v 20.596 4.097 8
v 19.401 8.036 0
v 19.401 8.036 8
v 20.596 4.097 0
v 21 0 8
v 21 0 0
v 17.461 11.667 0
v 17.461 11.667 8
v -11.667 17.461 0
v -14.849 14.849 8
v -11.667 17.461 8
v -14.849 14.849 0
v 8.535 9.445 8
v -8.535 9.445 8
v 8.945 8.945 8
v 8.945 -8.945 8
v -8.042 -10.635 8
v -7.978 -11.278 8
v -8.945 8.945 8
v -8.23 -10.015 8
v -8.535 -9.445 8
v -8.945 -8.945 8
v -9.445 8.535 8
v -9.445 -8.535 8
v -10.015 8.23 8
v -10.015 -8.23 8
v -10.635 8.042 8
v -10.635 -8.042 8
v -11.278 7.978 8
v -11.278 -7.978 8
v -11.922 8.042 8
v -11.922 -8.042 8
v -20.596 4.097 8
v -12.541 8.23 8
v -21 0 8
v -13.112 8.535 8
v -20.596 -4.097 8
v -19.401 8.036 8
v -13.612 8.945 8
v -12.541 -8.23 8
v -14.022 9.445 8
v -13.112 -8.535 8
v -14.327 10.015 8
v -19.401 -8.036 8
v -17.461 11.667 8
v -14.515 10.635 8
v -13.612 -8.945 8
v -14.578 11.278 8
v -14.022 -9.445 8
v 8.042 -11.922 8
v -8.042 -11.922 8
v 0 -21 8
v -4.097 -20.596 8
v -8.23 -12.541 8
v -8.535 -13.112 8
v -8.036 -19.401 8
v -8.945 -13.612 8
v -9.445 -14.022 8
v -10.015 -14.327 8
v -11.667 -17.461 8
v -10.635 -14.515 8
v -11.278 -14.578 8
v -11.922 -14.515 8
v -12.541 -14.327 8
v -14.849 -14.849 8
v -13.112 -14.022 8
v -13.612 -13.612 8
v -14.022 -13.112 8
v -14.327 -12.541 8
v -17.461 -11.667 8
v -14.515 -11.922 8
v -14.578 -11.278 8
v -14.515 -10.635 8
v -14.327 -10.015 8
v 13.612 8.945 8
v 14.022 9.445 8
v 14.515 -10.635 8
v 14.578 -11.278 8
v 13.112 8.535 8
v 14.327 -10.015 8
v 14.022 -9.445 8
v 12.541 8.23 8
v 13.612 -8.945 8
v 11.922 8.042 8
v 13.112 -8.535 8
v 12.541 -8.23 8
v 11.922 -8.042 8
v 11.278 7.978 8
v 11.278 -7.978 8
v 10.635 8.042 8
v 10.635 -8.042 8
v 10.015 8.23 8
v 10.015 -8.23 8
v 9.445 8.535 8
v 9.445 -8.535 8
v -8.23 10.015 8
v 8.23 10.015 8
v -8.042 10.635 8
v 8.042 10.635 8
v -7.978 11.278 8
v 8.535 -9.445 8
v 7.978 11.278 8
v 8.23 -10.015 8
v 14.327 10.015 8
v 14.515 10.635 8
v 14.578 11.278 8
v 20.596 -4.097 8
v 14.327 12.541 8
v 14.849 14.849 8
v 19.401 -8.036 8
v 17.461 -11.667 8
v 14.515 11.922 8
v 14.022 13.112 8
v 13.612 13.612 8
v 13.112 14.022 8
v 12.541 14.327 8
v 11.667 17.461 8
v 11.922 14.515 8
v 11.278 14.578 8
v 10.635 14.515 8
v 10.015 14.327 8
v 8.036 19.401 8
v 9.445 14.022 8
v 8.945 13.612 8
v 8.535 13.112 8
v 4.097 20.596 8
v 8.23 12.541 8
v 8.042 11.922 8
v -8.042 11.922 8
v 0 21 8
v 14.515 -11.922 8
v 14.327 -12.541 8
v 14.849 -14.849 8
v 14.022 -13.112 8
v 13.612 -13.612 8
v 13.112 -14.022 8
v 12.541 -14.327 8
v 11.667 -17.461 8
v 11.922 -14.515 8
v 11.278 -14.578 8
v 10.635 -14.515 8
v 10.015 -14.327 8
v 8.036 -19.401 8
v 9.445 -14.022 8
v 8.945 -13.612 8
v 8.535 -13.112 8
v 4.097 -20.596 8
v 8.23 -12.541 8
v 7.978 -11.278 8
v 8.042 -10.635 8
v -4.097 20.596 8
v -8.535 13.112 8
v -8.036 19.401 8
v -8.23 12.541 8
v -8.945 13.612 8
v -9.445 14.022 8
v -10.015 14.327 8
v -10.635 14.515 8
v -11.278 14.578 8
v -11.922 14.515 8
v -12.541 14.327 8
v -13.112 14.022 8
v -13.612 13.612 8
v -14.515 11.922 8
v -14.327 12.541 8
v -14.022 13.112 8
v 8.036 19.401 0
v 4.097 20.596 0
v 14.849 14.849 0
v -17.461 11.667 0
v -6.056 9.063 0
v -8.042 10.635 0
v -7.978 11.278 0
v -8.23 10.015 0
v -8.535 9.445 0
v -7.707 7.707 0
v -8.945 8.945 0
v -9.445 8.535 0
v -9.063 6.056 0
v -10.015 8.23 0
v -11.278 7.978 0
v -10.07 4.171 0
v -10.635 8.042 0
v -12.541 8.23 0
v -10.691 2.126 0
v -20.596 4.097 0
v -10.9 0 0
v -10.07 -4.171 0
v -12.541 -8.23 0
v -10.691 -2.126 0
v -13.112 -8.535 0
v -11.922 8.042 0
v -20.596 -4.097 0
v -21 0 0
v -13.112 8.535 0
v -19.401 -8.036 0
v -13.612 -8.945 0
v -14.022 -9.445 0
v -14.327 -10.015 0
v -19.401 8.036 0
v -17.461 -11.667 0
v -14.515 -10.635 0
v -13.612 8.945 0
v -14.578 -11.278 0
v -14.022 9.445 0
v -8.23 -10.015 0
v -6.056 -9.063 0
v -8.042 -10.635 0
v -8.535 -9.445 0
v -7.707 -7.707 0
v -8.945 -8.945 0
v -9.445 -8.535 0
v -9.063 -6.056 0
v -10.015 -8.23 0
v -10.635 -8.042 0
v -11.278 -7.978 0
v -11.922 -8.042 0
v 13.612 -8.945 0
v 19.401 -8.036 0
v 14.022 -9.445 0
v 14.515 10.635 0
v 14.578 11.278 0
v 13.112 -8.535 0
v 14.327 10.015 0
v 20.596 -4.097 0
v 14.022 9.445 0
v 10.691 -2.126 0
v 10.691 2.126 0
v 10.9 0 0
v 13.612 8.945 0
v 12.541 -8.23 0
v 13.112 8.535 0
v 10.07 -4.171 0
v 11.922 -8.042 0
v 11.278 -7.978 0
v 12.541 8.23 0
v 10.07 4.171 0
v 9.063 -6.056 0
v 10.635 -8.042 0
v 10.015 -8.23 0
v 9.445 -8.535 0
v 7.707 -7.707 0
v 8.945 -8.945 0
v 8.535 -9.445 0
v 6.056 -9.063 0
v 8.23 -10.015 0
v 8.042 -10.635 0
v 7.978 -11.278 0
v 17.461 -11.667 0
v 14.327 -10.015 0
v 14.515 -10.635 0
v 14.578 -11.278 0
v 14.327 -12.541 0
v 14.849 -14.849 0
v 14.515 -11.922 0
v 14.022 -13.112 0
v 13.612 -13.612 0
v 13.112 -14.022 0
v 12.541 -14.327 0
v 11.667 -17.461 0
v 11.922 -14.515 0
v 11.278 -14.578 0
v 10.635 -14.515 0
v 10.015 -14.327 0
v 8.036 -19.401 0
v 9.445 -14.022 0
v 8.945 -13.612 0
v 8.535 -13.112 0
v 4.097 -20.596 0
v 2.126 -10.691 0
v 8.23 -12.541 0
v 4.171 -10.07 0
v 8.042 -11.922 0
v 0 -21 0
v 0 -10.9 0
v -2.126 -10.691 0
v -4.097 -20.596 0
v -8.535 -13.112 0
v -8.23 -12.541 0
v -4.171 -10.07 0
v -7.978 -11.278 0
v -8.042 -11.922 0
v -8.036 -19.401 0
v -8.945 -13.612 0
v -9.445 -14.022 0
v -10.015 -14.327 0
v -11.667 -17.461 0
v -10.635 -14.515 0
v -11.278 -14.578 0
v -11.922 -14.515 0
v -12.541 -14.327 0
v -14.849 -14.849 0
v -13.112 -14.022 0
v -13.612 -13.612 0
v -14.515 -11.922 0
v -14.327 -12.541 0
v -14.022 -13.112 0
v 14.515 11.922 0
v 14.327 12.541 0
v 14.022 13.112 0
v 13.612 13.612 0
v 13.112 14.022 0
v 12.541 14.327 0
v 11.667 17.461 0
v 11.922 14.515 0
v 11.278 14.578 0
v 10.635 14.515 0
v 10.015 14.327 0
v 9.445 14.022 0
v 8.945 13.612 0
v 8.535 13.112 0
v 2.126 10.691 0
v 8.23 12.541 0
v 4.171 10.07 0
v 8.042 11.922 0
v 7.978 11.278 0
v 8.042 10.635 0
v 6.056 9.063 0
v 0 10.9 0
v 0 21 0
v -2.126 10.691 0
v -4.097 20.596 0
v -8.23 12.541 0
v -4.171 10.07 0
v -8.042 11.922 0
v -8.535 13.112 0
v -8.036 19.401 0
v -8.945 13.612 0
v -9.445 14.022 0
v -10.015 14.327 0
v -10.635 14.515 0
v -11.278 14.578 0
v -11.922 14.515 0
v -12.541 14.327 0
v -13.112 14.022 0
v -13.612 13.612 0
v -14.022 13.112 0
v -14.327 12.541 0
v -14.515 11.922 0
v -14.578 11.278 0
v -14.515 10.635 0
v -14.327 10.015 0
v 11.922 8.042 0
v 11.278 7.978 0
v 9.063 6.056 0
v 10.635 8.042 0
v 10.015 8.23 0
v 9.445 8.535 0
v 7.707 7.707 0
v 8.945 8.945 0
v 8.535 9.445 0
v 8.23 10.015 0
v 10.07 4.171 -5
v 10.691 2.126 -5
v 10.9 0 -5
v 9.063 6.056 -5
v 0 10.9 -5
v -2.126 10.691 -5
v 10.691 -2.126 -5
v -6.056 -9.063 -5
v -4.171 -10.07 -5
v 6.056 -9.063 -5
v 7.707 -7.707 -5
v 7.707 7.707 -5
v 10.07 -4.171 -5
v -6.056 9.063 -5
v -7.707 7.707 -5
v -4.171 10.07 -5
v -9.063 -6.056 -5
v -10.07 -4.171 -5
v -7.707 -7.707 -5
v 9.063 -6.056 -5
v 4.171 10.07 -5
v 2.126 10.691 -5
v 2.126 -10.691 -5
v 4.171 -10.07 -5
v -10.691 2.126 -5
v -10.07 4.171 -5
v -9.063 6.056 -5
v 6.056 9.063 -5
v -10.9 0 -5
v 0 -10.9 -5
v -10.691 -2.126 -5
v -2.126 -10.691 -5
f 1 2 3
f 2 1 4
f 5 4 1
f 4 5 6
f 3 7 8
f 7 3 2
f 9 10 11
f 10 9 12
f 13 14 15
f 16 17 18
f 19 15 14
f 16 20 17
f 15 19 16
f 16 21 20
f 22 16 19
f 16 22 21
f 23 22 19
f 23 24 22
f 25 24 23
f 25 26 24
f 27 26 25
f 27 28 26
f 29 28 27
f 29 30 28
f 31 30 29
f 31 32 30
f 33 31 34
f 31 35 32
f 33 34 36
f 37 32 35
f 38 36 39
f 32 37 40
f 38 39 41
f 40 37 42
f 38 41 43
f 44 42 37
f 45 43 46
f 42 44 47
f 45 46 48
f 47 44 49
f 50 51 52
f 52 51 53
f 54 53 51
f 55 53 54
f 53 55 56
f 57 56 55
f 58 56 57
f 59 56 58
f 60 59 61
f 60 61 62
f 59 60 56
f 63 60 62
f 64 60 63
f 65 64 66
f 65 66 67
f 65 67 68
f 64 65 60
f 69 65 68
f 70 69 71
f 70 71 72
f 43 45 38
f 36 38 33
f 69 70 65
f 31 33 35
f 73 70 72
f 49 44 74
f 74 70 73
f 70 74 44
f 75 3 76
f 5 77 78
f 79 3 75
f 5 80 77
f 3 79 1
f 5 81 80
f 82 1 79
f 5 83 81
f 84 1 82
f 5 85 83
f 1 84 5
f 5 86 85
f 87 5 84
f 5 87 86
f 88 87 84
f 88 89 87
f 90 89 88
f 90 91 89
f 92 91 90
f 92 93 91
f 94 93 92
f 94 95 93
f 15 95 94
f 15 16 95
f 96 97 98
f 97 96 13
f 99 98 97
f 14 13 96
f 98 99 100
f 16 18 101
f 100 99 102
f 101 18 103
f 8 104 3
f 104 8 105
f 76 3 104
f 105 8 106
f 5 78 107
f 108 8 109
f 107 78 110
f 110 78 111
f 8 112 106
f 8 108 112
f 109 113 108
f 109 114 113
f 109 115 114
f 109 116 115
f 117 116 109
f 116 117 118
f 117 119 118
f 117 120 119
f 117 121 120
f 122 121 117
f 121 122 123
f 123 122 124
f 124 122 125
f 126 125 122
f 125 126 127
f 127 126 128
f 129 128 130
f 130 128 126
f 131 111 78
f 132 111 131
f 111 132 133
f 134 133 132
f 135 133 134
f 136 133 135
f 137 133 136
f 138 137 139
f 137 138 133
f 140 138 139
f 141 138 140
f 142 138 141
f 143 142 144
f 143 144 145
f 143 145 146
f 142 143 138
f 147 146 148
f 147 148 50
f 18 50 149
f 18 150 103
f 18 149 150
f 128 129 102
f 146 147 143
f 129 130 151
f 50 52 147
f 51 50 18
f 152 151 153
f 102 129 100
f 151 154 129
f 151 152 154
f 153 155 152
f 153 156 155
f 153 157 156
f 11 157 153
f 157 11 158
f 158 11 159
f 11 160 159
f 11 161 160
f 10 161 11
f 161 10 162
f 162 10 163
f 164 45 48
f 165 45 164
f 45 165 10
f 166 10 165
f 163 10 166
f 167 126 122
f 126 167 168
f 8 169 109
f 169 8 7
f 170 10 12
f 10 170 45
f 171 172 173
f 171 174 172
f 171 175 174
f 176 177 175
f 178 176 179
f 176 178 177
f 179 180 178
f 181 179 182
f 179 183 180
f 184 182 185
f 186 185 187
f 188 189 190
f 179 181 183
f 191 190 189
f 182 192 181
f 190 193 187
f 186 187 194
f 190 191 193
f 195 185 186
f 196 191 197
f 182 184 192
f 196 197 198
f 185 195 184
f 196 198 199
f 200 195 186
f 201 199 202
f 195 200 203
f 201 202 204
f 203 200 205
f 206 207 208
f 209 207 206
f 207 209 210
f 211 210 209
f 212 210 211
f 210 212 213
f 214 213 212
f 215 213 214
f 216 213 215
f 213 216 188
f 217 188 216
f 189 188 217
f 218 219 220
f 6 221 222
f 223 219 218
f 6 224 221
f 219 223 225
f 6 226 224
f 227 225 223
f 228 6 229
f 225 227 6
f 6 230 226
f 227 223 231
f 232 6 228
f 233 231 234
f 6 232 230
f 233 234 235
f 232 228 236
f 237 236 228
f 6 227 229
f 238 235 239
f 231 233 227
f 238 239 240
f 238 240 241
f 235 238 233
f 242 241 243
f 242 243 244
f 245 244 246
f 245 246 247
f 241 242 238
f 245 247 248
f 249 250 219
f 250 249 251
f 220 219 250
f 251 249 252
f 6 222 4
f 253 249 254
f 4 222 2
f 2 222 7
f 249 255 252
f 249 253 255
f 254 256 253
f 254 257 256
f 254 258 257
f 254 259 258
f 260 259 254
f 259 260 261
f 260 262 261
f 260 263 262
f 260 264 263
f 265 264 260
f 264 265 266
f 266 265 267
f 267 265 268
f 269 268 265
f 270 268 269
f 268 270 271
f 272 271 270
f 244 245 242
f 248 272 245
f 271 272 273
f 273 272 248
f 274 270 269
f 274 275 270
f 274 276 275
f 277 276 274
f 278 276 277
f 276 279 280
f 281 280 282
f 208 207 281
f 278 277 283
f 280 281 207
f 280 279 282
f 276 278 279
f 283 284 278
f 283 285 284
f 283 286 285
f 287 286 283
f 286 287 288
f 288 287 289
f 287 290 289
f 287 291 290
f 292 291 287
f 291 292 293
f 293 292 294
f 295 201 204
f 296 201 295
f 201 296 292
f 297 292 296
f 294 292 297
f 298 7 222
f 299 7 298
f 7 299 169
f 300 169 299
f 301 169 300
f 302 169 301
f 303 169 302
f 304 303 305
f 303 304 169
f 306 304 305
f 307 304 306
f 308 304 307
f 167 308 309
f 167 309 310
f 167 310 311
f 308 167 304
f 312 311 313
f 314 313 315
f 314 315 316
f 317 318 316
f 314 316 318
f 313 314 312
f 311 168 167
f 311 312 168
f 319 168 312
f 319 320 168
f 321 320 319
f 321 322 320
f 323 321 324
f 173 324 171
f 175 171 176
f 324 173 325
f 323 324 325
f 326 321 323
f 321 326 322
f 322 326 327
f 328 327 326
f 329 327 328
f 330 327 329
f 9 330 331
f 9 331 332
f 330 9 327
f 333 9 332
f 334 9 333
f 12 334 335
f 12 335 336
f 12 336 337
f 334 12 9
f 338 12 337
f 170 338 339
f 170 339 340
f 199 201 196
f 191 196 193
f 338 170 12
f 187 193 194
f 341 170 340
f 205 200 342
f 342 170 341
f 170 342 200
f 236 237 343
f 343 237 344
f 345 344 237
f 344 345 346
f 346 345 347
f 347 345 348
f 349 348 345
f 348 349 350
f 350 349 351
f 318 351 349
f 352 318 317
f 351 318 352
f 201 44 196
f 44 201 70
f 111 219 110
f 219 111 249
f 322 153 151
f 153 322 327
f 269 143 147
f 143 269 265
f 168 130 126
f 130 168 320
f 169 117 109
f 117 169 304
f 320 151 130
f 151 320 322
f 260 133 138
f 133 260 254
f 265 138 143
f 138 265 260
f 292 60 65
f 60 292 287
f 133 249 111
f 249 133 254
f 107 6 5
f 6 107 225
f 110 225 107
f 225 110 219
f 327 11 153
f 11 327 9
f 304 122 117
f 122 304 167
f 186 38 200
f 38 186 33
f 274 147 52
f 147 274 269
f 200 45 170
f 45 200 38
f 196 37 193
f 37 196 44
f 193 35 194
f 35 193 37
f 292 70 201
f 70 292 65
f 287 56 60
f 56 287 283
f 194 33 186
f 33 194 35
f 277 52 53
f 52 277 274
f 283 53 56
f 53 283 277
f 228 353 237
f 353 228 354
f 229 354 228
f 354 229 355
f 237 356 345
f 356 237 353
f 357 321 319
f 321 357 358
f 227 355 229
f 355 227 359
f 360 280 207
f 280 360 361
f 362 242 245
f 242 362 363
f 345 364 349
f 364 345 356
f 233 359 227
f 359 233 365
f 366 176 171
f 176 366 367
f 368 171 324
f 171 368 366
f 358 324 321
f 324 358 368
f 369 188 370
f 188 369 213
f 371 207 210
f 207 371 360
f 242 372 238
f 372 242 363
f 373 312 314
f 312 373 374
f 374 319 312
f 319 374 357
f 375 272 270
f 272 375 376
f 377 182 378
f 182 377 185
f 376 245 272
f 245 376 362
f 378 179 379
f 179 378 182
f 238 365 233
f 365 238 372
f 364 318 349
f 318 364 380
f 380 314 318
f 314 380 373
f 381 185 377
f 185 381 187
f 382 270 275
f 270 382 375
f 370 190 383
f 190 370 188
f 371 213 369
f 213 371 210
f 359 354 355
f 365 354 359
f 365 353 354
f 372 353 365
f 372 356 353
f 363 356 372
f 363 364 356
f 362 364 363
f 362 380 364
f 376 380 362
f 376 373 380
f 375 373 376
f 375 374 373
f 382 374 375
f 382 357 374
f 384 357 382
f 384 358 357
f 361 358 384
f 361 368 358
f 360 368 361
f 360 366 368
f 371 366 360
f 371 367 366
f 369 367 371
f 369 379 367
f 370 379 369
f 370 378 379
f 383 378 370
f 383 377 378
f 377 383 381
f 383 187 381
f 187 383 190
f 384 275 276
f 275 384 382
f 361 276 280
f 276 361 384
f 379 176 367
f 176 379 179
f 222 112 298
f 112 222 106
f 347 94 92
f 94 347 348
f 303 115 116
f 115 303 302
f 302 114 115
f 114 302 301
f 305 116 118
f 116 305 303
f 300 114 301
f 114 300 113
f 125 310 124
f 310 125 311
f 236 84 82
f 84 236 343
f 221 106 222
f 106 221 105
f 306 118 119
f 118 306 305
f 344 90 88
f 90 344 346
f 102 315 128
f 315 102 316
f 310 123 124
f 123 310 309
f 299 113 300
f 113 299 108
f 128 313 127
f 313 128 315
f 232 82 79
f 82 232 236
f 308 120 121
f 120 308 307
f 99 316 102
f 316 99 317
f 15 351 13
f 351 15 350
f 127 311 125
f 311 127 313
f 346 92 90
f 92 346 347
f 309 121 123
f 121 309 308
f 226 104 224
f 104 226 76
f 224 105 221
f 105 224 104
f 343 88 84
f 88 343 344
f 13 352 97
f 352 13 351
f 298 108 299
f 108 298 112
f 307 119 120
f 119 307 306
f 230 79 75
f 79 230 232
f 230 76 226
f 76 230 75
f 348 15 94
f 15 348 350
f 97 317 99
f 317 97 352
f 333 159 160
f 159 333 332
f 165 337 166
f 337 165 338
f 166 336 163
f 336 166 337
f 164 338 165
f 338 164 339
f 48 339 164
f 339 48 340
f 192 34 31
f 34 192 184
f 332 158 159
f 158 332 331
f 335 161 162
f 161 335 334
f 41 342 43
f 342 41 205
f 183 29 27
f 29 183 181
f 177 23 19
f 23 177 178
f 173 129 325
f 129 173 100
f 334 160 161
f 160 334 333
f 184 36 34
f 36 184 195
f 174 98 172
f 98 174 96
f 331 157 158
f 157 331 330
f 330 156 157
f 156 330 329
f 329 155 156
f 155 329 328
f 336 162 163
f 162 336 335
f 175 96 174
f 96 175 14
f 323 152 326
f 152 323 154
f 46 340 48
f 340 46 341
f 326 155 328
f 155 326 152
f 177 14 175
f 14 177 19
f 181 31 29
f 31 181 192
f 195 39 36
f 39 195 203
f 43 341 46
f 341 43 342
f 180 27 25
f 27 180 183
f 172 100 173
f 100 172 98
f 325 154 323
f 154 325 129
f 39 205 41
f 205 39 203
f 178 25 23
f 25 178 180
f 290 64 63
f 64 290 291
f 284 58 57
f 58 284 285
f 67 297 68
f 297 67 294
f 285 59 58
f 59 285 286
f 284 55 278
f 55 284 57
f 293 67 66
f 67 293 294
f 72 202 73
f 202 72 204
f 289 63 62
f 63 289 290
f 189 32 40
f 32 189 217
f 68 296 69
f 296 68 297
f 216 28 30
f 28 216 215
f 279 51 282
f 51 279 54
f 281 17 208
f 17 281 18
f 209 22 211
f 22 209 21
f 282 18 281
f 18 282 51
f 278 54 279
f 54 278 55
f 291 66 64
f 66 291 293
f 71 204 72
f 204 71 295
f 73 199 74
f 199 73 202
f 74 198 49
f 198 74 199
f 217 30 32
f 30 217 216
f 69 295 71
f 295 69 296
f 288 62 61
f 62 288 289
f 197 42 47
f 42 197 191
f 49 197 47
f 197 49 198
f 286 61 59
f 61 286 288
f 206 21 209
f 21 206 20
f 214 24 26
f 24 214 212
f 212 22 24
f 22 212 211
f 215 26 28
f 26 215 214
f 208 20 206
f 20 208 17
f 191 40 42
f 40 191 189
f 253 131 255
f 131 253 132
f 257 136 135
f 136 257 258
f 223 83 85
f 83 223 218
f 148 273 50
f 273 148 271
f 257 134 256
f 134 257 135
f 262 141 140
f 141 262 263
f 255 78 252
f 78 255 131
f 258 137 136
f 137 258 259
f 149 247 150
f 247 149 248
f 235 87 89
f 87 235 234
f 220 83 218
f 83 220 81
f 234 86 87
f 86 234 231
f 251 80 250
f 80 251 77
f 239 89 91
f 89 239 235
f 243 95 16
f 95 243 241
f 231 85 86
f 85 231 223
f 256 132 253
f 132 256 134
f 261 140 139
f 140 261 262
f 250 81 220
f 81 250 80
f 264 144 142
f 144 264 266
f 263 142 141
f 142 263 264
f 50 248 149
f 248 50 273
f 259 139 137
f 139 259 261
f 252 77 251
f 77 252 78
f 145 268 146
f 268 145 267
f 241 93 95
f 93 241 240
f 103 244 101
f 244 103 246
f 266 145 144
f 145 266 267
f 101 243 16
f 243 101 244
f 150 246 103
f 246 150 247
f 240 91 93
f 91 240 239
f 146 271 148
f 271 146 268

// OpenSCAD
$fn = 32;

// ----------------------------------------------------------------------
// Retaining cap: 608 cover, 42 mm, spigot 21.8 mm
// ----------------------------------------------------------------------

// --- parameters (mm) ---
cap_d = 42;               // cover diameter
cap_t = 8;                // cover thickness
lip_d = 21.8;             // spigot that enters the housing
lip_h = 5;                // spigot height
bolt_d = 6.6;             // bolt clearance
bolt_r = 15.95;           // bolt circle radius

module cover() {
  cylinder(h = cap_t, d = cap_d);
}

module spigot() {
  /* sunk 1 mm into the cover; the spigot sets the overall height */
  translate([0, 0, -lip_h]) cylinder(h = lip_h + 1, d = lip_d);
}

difference() {
  union() {
    cover();
    spigot();
  }
  for (i = [0 : 3]) rotate([0, 0, 45 + i * 90]) translate([bolt_r, 0, -lip_h - 1])
    cylinder(h = lip_h + cap_t + 2, d = bolt_d);
}
